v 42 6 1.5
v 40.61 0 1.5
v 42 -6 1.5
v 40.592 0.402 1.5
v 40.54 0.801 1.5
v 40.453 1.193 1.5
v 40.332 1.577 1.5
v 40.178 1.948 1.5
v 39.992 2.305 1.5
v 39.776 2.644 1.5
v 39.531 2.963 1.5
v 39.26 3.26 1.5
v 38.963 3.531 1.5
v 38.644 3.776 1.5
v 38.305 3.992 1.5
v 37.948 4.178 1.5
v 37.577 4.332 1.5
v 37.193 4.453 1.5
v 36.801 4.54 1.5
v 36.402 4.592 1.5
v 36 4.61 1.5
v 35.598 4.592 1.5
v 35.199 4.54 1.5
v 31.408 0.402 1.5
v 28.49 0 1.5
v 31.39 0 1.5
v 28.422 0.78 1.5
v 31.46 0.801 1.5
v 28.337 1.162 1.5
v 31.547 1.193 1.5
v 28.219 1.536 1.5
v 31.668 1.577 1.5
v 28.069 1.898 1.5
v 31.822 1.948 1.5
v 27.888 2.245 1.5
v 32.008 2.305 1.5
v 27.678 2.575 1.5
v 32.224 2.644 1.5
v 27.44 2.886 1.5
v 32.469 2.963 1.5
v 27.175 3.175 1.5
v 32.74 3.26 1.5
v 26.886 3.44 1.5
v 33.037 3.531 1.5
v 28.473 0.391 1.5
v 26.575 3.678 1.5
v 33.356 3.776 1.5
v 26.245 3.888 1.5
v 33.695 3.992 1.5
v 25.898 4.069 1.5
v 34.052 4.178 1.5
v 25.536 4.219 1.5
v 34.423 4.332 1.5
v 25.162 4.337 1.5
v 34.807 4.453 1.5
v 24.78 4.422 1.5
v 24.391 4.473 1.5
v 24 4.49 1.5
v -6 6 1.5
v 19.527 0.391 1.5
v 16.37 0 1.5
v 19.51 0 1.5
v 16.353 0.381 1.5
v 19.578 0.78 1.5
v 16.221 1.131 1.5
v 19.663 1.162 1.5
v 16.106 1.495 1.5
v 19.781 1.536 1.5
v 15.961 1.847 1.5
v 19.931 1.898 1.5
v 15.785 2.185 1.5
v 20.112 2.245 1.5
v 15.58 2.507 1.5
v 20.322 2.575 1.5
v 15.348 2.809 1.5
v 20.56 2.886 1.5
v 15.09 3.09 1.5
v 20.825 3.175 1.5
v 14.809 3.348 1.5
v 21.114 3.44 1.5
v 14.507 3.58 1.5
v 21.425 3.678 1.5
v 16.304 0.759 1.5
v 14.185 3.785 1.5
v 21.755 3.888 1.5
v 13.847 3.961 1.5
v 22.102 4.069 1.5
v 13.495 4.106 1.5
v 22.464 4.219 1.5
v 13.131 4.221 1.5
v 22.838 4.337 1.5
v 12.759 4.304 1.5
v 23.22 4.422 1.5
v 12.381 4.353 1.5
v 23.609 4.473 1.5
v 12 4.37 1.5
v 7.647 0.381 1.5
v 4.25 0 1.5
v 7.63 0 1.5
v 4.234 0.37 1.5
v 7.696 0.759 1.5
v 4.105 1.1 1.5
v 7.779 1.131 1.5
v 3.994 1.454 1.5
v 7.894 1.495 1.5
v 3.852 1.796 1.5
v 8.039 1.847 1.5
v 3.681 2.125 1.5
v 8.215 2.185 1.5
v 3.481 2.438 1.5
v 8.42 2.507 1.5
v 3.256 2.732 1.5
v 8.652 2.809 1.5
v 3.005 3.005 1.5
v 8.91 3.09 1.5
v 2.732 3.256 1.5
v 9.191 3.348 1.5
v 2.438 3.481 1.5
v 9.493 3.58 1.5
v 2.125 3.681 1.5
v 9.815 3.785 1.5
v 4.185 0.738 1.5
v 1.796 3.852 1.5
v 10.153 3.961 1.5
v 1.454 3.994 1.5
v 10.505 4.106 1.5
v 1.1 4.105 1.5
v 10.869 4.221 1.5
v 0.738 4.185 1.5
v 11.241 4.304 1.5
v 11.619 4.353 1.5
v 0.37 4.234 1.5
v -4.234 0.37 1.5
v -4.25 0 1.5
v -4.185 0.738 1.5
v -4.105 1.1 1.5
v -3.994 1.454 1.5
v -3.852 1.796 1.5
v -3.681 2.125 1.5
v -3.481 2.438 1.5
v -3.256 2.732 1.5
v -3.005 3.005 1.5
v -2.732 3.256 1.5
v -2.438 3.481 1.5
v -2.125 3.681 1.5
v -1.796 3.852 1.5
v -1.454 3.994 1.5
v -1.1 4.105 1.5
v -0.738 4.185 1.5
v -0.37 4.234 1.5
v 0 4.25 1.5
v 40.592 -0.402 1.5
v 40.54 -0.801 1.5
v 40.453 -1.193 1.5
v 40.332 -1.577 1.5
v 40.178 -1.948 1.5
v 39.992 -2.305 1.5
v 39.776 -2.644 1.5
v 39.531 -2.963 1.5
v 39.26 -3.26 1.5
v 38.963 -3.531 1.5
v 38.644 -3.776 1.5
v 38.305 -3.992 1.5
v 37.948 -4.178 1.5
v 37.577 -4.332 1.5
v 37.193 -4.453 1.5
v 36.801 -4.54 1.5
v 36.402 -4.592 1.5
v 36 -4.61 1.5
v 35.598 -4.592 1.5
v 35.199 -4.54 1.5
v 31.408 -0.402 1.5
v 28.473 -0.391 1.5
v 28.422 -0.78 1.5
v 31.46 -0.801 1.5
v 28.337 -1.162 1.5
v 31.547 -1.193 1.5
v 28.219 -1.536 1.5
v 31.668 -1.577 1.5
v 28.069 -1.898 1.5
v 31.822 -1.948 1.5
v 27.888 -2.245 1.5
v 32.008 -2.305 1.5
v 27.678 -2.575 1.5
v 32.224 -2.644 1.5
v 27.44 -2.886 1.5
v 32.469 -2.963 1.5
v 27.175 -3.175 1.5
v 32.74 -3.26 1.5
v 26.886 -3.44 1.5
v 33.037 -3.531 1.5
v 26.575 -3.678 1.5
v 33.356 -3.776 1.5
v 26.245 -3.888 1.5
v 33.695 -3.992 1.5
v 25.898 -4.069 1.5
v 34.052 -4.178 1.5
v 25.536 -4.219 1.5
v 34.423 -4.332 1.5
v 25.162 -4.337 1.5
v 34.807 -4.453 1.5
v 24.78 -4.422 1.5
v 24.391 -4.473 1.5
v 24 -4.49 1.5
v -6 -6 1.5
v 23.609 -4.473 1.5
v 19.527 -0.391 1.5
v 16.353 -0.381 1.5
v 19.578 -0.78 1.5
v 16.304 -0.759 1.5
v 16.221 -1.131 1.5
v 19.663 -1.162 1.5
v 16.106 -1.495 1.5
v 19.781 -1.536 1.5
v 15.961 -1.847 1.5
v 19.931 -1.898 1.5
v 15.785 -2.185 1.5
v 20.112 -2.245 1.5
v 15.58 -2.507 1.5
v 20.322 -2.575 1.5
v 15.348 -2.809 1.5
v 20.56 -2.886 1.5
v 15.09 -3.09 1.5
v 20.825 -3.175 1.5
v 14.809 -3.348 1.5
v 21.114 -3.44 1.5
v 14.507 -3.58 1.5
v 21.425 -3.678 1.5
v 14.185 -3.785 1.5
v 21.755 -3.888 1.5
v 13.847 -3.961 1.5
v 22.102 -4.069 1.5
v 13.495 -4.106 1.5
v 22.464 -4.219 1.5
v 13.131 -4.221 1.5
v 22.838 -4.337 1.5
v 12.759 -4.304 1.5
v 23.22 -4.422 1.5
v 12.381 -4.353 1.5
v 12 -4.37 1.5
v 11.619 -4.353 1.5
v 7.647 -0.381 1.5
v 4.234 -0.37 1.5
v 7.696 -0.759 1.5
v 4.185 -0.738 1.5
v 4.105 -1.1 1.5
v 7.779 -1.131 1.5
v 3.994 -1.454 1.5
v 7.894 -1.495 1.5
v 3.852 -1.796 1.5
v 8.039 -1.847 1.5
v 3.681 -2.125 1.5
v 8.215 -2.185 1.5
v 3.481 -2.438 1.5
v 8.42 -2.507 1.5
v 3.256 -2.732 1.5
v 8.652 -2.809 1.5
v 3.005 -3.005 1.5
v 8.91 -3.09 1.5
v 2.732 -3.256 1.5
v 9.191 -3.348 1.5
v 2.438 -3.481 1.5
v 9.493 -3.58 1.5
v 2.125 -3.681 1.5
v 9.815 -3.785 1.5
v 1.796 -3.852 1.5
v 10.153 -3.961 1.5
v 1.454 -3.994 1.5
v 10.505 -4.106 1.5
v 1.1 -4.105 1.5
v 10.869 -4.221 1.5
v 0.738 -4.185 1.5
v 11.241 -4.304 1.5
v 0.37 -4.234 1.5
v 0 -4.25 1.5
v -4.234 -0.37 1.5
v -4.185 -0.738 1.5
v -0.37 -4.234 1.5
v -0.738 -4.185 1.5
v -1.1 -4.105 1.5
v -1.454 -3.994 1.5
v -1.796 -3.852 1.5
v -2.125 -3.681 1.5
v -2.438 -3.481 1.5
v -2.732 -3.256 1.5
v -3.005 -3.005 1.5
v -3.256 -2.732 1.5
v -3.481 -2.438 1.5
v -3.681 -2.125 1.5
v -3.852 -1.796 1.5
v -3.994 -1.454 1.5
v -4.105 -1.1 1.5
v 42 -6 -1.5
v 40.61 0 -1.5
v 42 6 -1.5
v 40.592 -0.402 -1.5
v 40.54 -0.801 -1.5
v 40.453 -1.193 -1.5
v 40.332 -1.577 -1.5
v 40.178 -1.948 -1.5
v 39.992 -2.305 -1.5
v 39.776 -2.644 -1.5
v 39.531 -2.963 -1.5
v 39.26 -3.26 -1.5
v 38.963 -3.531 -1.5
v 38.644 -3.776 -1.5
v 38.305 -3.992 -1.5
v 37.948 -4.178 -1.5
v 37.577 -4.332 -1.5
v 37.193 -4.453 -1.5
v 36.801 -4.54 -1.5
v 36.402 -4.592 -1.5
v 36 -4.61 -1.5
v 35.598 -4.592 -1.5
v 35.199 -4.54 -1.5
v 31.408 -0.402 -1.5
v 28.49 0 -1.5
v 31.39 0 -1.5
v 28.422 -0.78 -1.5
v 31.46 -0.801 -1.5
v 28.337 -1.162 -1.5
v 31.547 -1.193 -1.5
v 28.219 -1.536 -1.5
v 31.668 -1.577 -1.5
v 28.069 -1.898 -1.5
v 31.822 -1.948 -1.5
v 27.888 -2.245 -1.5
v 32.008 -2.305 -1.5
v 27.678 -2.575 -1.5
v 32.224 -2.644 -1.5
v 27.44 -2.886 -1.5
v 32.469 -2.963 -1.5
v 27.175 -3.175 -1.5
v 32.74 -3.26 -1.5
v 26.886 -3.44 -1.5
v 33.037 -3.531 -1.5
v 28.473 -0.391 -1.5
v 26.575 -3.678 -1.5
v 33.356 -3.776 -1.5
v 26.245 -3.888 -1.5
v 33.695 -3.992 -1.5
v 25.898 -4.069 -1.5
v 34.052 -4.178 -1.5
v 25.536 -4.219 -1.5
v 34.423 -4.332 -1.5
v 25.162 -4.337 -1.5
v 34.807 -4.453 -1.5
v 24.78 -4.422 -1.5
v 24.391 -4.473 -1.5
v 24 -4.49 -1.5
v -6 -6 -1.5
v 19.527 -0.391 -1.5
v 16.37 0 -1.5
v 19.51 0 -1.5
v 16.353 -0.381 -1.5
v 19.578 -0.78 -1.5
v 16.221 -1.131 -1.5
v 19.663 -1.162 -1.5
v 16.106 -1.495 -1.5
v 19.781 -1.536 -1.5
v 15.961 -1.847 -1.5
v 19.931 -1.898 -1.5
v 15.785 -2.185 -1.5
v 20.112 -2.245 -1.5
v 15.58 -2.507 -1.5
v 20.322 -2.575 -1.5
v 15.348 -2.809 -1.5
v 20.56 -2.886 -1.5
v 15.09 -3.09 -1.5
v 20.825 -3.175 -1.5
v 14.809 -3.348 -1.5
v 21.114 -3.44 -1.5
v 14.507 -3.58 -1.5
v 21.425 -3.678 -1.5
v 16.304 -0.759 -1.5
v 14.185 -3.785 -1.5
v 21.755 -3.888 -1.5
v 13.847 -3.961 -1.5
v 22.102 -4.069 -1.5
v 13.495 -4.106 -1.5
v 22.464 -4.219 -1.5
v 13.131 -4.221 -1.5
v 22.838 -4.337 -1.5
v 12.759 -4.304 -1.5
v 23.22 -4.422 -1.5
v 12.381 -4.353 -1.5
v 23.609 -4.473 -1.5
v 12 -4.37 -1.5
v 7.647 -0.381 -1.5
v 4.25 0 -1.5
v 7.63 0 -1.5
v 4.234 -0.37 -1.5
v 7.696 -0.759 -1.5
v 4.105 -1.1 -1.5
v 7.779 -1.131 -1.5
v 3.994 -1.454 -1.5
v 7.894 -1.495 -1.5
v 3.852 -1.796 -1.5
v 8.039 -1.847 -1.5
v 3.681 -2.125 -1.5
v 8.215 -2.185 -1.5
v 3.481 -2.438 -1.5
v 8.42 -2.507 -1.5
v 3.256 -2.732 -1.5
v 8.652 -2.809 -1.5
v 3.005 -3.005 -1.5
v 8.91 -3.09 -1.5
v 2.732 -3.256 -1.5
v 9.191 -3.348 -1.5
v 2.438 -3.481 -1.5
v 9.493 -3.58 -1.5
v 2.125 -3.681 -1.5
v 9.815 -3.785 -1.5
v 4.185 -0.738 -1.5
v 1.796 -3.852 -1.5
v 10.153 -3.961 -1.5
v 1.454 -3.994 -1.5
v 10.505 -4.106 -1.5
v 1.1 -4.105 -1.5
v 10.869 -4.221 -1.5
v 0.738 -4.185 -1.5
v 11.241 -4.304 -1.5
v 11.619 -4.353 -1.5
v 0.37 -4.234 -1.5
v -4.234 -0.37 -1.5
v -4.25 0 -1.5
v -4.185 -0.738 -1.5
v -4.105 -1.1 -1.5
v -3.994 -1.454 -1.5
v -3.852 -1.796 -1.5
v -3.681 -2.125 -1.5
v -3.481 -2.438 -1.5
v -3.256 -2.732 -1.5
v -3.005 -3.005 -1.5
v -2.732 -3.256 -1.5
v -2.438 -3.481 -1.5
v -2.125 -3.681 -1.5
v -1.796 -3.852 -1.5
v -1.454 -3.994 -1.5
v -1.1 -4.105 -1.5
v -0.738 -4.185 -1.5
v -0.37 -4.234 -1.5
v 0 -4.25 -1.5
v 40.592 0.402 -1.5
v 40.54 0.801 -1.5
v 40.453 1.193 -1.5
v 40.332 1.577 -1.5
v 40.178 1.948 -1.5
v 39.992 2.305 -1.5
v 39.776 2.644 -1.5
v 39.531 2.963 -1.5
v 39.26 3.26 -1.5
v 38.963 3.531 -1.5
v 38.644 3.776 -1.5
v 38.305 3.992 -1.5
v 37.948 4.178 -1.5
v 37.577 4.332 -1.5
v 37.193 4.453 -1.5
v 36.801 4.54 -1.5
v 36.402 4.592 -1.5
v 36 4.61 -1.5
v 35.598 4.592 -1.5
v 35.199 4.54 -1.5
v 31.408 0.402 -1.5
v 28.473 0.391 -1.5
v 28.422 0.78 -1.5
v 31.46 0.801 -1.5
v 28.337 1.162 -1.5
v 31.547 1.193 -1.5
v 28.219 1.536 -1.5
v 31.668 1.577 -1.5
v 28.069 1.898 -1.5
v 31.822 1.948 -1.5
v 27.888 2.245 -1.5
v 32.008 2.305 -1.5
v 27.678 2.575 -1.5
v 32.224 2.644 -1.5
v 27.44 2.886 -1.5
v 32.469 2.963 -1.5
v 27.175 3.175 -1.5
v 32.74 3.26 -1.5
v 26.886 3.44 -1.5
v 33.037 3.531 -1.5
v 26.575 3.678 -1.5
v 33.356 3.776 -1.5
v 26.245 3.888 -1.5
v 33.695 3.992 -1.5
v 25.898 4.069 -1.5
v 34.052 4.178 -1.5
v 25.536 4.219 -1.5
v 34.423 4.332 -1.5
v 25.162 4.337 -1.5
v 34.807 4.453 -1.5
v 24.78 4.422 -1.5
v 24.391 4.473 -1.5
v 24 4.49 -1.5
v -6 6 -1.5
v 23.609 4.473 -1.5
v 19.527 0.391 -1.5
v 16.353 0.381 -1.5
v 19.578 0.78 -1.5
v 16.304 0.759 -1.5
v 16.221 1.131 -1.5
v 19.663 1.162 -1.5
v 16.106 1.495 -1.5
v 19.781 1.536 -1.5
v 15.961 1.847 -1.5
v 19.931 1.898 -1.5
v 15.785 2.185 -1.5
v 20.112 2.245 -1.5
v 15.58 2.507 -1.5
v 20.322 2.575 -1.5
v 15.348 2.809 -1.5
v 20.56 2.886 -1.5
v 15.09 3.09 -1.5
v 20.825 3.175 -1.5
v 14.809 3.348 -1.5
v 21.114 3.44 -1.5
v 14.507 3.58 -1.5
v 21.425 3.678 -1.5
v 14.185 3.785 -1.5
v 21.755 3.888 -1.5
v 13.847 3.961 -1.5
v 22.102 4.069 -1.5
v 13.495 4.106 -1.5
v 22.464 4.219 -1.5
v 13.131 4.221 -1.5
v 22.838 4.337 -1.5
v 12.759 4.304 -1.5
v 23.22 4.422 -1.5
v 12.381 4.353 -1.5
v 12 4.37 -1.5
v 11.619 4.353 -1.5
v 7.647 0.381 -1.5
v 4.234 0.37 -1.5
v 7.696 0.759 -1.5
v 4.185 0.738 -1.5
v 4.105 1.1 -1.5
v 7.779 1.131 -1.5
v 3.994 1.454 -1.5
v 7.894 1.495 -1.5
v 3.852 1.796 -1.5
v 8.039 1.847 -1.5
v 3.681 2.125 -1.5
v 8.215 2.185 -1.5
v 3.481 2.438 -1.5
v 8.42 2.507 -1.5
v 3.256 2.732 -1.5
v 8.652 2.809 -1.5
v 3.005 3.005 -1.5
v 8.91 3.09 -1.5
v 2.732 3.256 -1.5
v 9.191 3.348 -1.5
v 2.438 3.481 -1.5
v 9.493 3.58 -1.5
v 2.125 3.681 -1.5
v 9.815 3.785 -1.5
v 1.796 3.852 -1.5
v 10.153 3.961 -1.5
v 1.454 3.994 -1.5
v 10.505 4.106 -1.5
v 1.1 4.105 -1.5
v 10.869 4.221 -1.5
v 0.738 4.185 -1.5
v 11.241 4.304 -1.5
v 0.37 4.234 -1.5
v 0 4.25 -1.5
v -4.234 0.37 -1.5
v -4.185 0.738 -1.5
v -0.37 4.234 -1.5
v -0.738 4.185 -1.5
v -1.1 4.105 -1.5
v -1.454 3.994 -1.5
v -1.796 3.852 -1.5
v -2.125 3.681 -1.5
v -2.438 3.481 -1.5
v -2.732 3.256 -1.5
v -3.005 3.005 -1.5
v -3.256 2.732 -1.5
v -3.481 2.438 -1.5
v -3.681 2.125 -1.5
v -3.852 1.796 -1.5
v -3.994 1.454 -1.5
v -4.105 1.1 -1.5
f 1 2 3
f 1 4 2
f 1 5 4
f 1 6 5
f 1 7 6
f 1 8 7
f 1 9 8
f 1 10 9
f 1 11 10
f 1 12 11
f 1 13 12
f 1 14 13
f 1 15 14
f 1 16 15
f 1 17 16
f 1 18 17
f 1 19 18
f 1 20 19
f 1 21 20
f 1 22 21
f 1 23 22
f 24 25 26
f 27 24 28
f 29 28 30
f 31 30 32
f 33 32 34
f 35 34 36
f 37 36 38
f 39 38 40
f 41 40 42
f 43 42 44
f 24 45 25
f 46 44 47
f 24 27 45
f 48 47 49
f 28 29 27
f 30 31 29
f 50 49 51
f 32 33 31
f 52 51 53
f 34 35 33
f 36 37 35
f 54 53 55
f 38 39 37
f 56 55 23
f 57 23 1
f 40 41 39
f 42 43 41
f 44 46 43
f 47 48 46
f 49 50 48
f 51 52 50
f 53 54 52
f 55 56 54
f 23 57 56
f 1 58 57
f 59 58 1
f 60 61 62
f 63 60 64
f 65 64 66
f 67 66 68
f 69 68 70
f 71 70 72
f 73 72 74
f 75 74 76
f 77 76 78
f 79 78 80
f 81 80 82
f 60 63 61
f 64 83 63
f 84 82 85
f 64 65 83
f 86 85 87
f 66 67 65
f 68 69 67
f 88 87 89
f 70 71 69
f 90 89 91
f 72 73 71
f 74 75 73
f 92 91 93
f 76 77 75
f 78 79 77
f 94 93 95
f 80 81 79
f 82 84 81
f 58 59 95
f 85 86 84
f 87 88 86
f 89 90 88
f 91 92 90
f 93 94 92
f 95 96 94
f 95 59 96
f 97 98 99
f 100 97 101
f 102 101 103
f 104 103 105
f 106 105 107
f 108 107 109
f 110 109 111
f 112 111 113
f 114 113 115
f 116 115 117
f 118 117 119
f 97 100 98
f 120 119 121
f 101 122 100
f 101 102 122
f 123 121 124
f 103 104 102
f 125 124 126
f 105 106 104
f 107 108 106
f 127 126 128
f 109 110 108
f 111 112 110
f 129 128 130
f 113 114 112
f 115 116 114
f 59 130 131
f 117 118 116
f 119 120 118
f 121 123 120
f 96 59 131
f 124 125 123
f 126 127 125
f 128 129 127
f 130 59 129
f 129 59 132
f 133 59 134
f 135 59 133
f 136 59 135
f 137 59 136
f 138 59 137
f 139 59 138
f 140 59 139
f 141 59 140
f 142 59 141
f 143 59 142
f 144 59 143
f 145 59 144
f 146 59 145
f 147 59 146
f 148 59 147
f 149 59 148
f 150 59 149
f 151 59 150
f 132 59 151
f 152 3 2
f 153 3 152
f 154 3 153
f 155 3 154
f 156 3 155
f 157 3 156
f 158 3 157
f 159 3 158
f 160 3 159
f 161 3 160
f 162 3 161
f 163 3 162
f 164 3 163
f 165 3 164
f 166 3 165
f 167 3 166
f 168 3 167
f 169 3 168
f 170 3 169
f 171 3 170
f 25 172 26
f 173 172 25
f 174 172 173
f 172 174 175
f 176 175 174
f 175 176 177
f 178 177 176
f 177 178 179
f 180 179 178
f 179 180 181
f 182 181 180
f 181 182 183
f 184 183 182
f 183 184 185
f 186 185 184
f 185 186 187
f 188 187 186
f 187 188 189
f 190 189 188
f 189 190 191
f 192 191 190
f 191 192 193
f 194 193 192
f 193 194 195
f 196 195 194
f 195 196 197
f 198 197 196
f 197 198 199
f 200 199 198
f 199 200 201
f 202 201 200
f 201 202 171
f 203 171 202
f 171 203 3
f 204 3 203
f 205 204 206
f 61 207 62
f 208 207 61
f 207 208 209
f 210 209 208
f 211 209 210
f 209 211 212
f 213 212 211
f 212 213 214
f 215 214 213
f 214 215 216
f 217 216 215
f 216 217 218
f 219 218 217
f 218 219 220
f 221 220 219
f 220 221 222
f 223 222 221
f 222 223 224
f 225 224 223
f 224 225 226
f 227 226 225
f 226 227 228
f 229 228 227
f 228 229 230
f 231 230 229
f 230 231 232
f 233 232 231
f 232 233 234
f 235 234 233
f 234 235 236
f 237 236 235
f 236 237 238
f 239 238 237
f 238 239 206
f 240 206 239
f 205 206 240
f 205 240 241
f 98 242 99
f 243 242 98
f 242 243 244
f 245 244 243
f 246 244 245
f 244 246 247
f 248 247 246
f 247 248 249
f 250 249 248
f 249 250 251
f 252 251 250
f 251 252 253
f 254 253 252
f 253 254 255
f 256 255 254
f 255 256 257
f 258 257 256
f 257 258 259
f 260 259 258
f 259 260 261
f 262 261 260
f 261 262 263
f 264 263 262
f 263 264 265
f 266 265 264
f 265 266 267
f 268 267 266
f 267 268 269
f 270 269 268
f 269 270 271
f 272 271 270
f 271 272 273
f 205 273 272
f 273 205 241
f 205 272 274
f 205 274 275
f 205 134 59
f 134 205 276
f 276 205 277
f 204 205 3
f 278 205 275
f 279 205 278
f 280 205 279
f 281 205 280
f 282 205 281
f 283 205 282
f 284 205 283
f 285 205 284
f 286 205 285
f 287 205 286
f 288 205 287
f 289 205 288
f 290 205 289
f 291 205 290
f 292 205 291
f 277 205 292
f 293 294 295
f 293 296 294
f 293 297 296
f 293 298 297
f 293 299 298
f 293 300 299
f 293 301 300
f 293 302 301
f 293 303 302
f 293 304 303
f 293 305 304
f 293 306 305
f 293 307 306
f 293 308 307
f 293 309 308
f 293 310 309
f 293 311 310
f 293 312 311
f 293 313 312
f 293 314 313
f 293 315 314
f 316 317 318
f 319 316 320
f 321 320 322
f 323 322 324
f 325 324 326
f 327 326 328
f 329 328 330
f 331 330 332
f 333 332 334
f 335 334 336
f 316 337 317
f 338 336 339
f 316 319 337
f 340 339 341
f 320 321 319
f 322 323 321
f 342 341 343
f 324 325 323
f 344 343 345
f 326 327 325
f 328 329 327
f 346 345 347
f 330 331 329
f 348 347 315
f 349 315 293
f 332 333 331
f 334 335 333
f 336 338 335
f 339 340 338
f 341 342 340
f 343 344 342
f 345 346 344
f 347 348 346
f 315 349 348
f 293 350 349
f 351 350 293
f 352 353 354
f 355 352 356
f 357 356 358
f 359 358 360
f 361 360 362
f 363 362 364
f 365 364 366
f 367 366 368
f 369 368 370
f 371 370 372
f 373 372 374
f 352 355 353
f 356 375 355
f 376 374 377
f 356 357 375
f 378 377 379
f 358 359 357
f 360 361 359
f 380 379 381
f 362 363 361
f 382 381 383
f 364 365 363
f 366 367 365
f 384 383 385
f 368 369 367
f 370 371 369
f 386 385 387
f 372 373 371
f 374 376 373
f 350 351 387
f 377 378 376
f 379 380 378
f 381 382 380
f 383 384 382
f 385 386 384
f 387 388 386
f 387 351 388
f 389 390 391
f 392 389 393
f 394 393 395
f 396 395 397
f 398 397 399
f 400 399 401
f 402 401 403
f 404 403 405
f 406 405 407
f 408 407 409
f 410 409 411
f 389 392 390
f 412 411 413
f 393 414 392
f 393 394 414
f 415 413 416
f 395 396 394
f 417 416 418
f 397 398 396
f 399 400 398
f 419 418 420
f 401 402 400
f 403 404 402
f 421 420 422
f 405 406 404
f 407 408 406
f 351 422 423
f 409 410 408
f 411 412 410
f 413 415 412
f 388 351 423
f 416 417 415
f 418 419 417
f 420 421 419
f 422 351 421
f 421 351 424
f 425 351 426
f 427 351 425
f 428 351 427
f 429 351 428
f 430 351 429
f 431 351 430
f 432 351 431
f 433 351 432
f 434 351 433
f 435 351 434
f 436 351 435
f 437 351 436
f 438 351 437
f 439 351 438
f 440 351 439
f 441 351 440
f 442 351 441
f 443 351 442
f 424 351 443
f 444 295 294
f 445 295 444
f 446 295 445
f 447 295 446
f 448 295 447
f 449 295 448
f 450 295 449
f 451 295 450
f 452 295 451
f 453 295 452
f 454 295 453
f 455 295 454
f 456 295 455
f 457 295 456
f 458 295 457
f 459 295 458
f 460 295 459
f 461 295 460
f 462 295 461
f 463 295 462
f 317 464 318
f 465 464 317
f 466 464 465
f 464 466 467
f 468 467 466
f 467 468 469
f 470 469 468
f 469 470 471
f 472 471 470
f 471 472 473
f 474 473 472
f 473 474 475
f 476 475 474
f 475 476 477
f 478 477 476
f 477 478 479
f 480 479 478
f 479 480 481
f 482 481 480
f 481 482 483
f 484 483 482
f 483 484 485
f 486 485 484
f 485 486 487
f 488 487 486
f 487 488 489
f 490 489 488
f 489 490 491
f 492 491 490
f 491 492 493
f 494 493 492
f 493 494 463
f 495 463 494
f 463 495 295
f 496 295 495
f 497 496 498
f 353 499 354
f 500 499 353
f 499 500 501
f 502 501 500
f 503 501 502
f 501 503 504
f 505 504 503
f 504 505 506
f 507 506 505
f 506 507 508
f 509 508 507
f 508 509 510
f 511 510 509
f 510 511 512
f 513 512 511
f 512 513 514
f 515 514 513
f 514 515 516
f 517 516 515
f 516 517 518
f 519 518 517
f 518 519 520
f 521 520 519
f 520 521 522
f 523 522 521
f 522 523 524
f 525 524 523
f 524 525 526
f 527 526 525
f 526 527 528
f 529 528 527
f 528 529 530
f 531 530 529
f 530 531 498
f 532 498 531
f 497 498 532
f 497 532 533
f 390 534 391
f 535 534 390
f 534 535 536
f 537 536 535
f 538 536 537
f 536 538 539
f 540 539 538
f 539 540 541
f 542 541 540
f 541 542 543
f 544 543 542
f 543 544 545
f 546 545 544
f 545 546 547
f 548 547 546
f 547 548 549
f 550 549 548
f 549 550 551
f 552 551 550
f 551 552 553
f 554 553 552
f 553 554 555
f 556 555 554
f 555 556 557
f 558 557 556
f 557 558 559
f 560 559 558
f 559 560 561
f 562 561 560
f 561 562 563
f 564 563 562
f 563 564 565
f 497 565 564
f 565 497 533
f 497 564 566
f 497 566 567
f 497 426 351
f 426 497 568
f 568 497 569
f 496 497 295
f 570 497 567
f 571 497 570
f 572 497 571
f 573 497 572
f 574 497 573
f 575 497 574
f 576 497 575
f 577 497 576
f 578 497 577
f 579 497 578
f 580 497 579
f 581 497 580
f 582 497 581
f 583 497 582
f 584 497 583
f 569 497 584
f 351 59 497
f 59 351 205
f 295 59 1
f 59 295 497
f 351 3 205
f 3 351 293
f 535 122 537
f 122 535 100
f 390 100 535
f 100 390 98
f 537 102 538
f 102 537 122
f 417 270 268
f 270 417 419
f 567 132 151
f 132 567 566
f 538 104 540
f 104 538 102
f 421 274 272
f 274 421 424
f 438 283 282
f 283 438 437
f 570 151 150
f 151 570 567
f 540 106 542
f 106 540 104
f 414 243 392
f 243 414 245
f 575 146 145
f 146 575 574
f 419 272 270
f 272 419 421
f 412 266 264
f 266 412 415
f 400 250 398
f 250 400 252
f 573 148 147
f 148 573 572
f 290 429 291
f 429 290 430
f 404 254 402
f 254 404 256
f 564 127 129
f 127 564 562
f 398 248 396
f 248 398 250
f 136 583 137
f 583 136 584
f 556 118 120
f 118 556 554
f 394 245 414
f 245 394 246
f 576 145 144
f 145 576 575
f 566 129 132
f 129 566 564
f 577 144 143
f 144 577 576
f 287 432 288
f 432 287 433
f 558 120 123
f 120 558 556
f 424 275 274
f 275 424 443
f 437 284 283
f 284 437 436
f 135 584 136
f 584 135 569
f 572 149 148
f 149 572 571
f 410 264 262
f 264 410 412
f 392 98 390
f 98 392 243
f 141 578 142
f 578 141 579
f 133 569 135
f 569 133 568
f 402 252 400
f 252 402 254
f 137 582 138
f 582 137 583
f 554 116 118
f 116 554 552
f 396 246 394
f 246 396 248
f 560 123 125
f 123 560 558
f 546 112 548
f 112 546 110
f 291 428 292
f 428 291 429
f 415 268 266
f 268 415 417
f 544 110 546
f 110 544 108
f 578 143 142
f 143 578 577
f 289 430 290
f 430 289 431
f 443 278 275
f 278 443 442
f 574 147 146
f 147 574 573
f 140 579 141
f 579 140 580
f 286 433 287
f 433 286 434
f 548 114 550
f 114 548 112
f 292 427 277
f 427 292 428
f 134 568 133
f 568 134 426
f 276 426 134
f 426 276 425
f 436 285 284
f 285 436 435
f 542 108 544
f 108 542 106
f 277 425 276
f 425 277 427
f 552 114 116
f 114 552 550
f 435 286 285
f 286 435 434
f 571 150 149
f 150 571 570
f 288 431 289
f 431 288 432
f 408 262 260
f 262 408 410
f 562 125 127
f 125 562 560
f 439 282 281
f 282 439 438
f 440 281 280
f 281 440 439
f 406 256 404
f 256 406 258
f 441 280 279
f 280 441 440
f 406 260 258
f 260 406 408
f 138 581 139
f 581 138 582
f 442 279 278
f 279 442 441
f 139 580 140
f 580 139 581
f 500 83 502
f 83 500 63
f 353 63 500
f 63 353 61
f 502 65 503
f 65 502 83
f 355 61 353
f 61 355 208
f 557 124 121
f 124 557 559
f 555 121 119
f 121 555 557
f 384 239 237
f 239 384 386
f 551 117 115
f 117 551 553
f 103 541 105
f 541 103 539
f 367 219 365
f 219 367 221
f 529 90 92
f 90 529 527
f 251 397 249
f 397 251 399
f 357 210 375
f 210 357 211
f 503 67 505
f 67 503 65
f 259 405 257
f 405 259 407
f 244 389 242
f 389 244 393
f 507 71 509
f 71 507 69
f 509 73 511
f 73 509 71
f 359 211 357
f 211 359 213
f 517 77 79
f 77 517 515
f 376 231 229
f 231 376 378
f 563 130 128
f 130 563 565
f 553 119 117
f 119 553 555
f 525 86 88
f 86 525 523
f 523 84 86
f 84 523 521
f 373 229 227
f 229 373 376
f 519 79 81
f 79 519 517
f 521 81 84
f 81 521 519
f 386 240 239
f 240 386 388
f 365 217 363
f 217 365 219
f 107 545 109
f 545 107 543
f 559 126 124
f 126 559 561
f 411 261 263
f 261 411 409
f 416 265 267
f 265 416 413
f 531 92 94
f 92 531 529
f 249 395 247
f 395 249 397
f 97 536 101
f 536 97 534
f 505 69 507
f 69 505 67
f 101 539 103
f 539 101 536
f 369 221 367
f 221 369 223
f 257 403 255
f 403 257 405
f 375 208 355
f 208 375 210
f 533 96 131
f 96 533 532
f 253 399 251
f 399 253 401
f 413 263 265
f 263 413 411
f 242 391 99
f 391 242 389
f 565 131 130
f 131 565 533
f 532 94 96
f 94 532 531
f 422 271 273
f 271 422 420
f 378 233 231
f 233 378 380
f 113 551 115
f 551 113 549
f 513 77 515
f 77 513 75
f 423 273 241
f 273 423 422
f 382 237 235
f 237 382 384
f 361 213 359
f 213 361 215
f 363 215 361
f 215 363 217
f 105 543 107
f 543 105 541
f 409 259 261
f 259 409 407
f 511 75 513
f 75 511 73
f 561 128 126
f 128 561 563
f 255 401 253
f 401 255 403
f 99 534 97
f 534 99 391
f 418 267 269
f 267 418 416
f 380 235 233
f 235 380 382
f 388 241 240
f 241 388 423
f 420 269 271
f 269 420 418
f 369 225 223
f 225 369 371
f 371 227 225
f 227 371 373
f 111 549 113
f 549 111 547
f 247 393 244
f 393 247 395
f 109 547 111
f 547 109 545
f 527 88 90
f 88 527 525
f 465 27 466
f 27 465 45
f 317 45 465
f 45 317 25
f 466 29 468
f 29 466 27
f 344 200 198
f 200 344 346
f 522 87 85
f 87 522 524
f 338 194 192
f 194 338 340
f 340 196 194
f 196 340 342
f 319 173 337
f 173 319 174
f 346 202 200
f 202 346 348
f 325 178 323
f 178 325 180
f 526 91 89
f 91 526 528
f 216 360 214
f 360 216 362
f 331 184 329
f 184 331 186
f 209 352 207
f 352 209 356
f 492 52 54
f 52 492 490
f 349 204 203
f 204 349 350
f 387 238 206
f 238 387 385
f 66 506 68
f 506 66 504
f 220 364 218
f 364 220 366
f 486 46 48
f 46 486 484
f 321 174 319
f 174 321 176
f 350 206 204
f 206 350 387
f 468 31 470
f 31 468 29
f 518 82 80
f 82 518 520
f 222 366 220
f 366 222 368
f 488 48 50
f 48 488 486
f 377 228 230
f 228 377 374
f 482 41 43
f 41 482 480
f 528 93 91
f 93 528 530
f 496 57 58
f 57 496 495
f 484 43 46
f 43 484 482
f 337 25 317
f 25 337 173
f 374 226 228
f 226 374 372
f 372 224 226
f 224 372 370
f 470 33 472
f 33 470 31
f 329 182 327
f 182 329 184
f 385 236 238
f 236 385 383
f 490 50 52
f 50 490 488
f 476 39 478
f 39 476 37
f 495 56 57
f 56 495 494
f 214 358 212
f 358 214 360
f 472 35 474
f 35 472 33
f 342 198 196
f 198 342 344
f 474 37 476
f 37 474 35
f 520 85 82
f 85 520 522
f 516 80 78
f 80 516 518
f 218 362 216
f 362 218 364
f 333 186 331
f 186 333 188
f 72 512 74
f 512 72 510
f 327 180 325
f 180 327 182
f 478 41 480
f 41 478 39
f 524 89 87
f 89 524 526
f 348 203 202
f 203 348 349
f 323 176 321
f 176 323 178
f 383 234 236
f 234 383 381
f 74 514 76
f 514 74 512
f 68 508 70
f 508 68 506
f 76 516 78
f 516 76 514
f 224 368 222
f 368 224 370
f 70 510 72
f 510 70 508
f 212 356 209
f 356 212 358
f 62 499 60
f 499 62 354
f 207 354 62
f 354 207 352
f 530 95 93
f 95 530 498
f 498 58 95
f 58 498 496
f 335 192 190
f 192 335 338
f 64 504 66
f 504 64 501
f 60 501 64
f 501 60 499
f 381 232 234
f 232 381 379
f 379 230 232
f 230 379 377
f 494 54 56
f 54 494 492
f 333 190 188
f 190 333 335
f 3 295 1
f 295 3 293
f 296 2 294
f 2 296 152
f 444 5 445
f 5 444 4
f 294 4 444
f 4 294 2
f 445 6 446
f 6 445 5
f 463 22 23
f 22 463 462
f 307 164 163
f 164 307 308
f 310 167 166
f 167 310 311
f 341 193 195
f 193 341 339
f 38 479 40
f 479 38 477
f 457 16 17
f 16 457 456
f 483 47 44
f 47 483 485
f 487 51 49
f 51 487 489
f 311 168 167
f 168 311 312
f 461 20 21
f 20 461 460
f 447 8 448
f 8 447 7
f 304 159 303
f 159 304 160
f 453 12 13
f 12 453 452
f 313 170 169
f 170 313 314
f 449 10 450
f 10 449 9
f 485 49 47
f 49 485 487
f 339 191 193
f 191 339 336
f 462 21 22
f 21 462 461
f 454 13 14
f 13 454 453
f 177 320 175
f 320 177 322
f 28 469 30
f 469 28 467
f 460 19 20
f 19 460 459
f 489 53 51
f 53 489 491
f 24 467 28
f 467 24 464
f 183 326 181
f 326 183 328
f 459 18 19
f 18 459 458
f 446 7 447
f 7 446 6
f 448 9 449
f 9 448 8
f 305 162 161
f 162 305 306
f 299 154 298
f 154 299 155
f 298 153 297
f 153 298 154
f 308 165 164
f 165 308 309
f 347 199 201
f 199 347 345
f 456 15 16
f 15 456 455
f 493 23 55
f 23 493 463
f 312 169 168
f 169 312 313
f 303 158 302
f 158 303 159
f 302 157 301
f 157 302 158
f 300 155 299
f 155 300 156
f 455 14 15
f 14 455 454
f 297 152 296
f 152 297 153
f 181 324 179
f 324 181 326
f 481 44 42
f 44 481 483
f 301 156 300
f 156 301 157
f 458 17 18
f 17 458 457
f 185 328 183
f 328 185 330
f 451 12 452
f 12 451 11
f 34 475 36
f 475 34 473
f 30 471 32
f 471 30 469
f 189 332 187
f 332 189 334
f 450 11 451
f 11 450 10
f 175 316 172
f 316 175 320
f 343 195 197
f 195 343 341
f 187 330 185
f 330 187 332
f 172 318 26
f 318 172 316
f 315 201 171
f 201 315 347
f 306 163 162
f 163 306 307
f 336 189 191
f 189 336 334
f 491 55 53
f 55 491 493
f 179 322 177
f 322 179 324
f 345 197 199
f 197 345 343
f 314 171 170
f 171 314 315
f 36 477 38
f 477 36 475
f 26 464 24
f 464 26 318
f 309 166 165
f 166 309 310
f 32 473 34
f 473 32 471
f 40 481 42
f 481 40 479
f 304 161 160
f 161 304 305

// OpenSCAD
$fs = 0.1;  // Don't generate smaller facets than 0.1 mm
$fa = 5;    // Don't generate larger angles than 5 degrees



holeDiameter = 8.5;

 for (a =[0:3])difference(){rack(a); hole(a);};

     
module rack(a) {
    translate([a*12, 0, 0])
    color("Green") 
    cube([12,12,3], center=true);
    }

module hole(a) {
    color("Blue") 
    translate([a*12,0,-11]) 
    cylinder(h=14, r=((holeDiameter/2)+(a*.12)));    
    }    
